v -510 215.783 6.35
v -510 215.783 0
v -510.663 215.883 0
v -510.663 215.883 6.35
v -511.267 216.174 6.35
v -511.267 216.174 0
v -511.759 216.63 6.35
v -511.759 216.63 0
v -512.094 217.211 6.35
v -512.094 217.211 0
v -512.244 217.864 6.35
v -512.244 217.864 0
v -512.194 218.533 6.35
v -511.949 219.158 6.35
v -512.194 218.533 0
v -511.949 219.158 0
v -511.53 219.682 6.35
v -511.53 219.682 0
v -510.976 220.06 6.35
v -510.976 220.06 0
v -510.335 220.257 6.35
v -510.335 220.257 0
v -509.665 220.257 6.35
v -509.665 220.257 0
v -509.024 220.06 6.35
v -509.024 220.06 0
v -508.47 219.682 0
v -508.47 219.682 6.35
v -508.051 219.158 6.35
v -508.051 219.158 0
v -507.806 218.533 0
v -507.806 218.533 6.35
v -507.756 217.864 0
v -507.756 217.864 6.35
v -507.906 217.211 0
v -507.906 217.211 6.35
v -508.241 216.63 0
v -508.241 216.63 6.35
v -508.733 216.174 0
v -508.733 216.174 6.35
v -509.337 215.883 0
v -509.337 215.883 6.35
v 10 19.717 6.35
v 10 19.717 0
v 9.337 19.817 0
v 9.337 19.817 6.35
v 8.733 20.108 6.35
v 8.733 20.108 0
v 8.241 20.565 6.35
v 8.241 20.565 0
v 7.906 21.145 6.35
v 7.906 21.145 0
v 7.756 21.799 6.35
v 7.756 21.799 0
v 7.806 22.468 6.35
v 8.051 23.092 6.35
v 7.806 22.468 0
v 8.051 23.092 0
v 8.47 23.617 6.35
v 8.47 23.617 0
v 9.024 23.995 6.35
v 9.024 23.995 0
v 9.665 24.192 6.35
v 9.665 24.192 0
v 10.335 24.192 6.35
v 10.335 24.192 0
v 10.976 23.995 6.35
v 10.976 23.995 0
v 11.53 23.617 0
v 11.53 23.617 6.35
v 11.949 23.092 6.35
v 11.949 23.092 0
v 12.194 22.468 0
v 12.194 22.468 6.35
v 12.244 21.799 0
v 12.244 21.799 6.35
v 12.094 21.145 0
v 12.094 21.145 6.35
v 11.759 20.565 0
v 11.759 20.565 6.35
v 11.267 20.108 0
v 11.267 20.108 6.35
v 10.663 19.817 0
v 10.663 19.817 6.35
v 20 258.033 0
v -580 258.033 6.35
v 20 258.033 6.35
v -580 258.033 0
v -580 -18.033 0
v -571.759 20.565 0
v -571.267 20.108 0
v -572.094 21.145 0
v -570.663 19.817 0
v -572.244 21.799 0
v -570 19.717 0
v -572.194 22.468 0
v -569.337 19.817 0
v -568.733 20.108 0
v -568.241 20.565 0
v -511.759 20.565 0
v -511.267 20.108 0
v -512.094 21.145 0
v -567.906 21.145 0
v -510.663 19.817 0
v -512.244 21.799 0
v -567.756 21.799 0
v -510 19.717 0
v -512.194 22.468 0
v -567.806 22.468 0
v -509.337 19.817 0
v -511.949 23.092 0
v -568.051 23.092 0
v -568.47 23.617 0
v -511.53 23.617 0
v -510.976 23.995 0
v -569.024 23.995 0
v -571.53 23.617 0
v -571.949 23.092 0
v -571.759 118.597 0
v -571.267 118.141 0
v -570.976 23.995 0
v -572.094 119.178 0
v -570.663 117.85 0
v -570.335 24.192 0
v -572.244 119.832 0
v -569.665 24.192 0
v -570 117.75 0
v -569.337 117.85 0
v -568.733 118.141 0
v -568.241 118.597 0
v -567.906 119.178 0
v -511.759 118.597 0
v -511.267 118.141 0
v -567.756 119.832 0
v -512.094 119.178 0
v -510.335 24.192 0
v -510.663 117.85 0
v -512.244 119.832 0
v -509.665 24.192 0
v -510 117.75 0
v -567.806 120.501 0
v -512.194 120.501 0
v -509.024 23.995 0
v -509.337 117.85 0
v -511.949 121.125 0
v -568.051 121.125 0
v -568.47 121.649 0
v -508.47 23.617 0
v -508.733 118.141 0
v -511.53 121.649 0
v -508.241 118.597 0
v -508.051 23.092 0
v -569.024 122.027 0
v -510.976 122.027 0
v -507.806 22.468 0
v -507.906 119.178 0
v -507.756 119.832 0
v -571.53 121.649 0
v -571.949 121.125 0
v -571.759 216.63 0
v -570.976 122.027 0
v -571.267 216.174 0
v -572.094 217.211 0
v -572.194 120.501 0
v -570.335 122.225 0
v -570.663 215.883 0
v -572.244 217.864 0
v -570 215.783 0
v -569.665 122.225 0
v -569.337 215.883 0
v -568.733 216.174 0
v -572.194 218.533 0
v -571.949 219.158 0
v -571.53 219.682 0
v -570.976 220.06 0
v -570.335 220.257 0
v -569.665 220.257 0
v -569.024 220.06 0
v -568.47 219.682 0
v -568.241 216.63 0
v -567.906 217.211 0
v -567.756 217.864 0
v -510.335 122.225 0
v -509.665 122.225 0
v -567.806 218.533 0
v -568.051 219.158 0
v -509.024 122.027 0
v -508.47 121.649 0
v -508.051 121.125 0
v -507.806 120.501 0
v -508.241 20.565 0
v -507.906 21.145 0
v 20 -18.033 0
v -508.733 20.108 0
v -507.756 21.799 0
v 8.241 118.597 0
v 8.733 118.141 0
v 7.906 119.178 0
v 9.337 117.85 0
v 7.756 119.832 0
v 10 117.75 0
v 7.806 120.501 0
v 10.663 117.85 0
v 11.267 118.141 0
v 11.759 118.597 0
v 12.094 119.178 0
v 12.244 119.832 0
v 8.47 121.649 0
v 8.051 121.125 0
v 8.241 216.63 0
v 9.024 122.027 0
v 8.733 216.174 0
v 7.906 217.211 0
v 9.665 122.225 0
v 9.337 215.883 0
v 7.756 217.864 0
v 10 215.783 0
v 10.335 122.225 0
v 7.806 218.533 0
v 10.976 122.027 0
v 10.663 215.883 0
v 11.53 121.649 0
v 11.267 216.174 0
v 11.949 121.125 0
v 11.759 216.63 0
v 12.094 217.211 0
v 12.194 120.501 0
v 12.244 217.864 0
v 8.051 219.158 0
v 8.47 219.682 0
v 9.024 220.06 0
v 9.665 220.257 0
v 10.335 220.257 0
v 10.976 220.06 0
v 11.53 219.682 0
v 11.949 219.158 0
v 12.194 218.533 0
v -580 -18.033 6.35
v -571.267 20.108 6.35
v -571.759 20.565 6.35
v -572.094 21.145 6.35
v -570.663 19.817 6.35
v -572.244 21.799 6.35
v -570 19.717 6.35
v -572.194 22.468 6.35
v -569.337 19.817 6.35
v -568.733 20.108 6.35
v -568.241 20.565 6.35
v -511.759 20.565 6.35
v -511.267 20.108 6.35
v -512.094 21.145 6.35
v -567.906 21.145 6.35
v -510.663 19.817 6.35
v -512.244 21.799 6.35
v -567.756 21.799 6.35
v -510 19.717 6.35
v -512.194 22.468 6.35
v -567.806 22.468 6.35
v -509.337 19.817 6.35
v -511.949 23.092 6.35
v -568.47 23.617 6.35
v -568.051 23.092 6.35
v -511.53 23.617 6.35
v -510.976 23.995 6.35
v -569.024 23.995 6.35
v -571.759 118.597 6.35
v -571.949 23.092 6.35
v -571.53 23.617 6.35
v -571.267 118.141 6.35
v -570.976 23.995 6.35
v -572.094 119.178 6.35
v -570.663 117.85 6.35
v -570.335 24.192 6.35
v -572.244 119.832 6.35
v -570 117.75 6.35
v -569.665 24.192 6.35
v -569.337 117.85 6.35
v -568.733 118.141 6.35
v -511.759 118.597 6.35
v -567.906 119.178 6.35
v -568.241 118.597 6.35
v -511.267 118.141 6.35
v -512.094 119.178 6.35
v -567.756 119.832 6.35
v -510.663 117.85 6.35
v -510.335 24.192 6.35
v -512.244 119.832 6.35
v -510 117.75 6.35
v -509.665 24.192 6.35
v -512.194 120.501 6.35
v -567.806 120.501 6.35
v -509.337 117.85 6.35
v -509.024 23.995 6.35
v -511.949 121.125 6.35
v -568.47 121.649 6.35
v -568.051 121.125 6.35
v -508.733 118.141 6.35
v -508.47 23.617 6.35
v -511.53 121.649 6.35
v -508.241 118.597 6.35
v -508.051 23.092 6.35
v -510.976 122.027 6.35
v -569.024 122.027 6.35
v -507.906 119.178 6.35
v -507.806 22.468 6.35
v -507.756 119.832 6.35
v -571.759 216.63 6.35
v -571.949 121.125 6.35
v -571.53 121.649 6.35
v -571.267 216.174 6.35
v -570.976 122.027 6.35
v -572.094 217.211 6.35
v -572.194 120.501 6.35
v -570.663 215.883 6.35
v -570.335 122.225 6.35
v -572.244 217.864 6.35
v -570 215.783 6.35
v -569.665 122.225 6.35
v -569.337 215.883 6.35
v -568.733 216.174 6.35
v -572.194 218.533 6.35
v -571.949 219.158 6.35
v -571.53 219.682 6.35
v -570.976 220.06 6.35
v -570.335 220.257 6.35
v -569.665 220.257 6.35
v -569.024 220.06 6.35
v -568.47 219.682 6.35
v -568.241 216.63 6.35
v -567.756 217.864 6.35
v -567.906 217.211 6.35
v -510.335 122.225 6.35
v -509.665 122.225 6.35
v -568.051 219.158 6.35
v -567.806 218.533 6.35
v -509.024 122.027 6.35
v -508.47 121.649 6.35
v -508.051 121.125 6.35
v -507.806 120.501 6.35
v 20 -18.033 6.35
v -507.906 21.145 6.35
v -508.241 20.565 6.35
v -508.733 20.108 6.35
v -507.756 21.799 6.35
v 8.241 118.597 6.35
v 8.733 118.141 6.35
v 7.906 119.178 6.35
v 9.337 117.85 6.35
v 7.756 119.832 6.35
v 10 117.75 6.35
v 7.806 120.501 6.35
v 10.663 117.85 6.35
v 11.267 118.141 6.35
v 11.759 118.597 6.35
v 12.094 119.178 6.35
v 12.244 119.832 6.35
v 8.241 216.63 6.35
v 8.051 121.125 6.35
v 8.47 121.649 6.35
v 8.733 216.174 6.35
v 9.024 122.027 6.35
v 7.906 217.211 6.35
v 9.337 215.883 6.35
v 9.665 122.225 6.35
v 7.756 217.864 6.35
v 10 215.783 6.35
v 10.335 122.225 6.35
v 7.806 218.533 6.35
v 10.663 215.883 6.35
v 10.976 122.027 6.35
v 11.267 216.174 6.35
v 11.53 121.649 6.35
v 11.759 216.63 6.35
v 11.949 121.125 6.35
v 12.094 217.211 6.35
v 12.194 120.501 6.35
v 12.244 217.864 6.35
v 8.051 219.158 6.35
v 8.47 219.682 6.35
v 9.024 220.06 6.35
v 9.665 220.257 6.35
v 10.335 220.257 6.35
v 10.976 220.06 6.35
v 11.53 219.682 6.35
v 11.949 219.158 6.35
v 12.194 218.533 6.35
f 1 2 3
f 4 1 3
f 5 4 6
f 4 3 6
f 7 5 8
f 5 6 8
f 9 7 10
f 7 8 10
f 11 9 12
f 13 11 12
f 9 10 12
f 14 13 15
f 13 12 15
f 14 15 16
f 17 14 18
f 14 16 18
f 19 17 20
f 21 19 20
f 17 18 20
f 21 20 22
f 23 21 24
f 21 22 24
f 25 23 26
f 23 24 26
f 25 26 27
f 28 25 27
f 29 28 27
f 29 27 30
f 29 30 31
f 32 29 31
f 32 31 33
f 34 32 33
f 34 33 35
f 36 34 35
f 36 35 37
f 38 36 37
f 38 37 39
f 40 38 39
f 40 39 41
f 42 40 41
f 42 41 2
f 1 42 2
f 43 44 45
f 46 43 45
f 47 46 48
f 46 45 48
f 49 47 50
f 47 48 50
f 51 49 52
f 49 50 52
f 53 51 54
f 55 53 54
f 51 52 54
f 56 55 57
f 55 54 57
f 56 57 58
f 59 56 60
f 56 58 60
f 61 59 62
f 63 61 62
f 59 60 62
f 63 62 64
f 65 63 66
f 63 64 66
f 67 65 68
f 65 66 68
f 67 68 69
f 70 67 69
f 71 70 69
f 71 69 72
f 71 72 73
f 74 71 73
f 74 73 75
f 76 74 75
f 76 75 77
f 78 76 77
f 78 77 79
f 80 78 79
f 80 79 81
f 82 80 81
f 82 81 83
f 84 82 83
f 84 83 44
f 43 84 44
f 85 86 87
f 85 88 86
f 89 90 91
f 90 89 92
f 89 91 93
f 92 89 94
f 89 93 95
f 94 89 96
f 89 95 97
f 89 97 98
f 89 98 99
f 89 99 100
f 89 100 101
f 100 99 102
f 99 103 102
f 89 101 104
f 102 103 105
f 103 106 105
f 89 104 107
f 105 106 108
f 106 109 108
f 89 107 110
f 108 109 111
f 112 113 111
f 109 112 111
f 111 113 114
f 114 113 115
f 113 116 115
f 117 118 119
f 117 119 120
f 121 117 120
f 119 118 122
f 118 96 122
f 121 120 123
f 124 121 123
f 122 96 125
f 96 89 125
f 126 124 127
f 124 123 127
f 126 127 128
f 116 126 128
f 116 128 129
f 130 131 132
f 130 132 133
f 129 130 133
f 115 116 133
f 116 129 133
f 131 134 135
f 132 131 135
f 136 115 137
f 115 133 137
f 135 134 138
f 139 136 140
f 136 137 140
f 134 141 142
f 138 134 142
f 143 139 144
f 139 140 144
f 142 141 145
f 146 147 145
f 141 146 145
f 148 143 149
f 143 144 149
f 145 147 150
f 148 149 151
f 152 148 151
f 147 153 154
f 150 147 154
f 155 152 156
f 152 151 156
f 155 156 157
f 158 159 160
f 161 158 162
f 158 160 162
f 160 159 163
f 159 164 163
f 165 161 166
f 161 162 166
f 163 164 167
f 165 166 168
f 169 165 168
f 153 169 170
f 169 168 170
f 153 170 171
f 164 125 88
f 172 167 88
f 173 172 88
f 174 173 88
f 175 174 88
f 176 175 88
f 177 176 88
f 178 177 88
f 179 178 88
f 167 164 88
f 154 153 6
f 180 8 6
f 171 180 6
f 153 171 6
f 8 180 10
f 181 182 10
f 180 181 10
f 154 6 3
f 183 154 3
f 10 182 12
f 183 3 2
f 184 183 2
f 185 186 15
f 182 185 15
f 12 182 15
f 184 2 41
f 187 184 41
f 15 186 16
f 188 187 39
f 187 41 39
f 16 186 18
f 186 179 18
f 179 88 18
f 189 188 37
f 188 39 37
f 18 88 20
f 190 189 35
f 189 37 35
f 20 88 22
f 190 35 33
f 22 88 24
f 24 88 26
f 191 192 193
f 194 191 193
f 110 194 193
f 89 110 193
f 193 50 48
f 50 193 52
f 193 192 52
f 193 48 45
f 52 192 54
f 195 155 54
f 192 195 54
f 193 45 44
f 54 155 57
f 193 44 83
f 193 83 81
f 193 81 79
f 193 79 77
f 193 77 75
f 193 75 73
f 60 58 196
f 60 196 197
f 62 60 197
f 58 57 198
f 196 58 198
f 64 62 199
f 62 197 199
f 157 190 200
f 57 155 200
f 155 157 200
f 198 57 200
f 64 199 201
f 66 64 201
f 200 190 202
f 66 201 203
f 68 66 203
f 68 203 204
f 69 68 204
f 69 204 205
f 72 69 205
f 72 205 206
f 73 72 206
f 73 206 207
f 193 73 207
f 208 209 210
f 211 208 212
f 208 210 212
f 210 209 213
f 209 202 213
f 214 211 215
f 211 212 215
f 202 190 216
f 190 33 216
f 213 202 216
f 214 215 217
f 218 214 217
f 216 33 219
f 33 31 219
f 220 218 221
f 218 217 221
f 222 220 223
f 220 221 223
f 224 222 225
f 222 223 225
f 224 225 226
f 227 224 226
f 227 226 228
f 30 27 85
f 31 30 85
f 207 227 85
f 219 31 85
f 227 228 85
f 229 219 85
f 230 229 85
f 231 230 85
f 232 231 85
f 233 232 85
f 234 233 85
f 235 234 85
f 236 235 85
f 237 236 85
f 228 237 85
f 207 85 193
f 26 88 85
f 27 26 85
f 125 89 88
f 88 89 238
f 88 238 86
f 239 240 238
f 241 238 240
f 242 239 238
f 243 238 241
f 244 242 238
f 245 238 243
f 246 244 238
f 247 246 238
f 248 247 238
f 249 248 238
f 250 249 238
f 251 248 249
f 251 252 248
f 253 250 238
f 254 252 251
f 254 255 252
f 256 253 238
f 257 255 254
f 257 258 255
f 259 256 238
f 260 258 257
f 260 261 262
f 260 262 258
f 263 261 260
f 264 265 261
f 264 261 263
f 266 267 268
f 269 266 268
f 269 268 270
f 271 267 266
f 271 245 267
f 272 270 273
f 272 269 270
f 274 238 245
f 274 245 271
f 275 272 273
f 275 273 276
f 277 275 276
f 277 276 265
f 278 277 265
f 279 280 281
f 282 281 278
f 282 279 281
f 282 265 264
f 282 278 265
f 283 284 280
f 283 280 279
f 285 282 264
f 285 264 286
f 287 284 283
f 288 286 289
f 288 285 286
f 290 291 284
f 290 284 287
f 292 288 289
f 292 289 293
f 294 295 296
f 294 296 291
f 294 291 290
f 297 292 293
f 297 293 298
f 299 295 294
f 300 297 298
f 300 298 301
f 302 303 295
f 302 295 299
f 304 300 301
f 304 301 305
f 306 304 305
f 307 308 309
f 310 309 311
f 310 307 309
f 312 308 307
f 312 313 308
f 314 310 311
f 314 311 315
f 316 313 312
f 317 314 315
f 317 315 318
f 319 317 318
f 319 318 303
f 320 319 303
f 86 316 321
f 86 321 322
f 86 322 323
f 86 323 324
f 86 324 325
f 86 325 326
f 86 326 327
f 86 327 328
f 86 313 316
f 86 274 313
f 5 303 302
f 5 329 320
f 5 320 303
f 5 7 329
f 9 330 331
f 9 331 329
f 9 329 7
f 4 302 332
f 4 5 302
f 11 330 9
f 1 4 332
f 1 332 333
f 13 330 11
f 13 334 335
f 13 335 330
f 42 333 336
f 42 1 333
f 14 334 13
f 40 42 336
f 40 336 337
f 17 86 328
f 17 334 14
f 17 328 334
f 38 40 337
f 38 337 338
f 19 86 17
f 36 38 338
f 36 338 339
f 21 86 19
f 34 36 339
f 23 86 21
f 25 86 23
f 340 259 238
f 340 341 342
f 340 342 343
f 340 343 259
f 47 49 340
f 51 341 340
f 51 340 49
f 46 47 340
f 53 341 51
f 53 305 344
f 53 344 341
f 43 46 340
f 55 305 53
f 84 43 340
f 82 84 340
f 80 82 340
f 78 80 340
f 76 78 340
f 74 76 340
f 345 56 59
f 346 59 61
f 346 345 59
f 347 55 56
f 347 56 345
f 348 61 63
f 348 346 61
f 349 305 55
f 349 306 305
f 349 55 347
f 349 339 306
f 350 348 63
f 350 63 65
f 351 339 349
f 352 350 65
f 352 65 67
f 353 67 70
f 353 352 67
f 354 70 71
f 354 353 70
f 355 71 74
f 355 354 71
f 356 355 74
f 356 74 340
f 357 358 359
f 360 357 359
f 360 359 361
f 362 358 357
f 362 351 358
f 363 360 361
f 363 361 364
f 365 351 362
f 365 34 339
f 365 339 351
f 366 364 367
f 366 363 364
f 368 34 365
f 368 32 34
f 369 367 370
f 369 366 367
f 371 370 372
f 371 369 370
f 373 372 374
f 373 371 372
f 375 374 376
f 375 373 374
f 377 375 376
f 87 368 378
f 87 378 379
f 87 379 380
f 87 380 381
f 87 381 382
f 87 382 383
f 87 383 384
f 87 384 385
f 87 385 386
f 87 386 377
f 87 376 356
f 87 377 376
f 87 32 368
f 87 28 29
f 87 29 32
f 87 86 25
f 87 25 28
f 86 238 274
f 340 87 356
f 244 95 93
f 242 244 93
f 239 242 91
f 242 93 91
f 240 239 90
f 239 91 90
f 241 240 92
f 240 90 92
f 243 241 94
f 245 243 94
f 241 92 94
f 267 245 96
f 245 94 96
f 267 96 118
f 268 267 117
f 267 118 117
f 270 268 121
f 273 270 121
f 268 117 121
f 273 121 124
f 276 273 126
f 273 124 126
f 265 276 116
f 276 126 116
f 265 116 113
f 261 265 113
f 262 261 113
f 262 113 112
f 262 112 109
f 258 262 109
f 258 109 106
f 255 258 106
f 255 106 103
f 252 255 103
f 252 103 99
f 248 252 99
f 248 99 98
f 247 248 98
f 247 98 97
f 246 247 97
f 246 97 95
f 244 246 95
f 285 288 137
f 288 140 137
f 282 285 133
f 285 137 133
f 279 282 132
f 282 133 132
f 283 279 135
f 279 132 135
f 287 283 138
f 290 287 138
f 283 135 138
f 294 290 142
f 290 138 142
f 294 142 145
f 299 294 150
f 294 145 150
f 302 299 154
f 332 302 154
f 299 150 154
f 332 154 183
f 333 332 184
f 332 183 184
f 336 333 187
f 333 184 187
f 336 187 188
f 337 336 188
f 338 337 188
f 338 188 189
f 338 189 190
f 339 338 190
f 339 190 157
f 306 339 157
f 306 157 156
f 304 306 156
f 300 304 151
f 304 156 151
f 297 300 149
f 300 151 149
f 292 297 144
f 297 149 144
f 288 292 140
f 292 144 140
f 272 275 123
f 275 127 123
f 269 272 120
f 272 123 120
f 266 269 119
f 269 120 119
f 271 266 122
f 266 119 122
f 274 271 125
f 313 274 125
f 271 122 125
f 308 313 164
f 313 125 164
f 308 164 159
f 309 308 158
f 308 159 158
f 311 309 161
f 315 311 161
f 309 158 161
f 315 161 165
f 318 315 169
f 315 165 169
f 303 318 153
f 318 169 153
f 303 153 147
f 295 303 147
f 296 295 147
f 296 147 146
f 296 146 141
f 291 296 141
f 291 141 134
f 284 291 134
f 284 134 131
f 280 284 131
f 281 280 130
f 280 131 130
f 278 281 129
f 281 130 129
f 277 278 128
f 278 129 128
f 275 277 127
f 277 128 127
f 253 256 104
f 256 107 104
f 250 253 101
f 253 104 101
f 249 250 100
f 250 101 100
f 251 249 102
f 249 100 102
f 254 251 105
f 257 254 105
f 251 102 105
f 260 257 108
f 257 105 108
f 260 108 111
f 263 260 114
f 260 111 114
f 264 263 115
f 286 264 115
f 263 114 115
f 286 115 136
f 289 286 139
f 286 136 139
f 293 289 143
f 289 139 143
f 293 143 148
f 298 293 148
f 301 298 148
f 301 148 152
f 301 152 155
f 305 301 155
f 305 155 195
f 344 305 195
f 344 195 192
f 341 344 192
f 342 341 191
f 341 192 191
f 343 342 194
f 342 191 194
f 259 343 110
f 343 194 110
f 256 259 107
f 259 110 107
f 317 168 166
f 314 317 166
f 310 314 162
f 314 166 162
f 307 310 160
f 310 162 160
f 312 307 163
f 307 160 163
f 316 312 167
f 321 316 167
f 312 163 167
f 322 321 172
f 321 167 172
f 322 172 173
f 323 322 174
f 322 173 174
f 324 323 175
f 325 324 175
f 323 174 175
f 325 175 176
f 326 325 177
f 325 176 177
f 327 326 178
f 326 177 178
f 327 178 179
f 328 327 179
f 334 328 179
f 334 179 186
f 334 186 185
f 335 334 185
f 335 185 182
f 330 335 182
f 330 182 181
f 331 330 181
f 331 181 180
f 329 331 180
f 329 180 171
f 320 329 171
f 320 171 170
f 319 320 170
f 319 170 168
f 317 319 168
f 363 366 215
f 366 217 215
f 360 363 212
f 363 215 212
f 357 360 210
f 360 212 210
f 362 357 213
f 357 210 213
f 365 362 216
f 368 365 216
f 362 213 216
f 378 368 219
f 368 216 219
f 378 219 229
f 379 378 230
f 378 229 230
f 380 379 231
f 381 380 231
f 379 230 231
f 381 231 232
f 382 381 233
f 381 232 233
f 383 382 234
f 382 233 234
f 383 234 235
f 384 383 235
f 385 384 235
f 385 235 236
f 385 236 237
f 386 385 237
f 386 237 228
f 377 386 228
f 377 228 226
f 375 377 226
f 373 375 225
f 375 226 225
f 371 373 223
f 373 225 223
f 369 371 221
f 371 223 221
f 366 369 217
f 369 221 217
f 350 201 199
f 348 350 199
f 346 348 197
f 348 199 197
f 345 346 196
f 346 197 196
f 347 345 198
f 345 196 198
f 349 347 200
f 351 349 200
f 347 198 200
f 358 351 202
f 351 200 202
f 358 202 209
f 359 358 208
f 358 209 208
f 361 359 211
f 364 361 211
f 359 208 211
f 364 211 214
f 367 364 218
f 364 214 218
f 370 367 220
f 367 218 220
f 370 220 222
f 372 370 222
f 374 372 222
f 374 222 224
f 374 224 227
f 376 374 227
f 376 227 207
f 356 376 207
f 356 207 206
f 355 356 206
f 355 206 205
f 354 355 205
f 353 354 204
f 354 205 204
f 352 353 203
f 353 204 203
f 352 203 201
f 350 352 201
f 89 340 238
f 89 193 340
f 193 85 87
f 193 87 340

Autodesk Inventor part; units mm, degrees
ref_plane "YZ Plane" through (0, 0, 0) normal (1, 0, 0) x (0, 1, 0)
ref_plane "XZ Plane" through (0, 0, 0) normal (0, 1, 0) x (-1, 0, 0)
ref_plane "XY Plane" through (0, 0, 0) normal (0, 0, 1) x (1, 0, 0)
sketch "Sketch1" plane through (0, 0, 0) normal (0, 0, 1) x (1, 0, 0)
  line L0 (0, -18.0326) -> (20, -18.0326) projected
  line L1 (20, 0) -> (20, -18.0326) projected
  line L2 (-580, 258.0326) -> (-500, 258.0326) projected
  line L3 (-580, 240) -> (-580, 258.0326) projected
  line L4 (20, -18.0326) -> (-580, -18.0326)
  line L5 (-580, -18.0326) -> (-580, 258.0326)
  line L6 (-580, 258.0326) -> (20, 258.0326)
  line L7 (20, 258.0326) -> (20, -18.0326)
  point P0 (0, 0)
extrude "Extrusion1" add sketch "Sketch1" along normal blind 6.35
sketch "Sketch2" plane through (0, 0, 6.35) normal (0, 0, 1) x (1, 0, 0)
  line L0 (-580, -18.0326) -> (20, -18.0326) projected
  line L1 (20, -18.0326) -> (20, 258.0326) projected
  line L2 (20, 258.0326) -> (-580, 258.0326) projected
  line L3 (-580, 258.0326) -> (-580, -18.0326) projected
  circle A0 centre (20, 120) radius 10 construction
  line L4 (10, 258.0326) -> (10, -18.0326) construction
  circle A1 centre (10, 258.0326) radius 40 construction
  circle A2 centre (10, -18.0326) radius 40 construction
  line L5 (10, 218.0326) -> (-580, 218.0326) construction
  line L6 (10, 120) -> (-580, 120) construction
  line L7 (10, 21.9674) -> (-580, 21.9674) construction
  circle A3 centre (-580, 120) radius 10 construction
  circle A4 centre (-580, 120) radius 70 construction
  line L8 (-570, 258.0326) -> (-570, -18.0326) construction
  line L9 (-510, 258.0326) -> (-510, -18.0326) construction
  point P0 (0, 0)
  point P1 (-510, 218.0326)
  point P2 (-570, 218.0326)
  point P3 (-570, 120)
  point P4 (-510, 120)
  point P5 (-510, 21.9674)
  point P6 (-570, 21.9674)
  dimension "d3" = 80
  dimension "d4" = 80
  dimension "d2" = 20
  dimension "d5" = 20
  dimension "d6" = 140
hole "Hole1" at (10, 120, 6.35) at (10, 218.0326, 6.35) at (10, 21.9674, 6.35) at (-510, 218.0326, 6.35) at (-570, 218.0326, 6.35) at (-570, 120, 6.35) at (-510, 120, 6.35) at (-510, 21.9674, 6.35) at (-570, 21.9674, 6.35) direction (0, 0, -1) diameter 4.5 end through all clearance for "Socket Head Cap Screw" size "M4" standard "Ansi Metric M Profile"
properties part number "large wall"
